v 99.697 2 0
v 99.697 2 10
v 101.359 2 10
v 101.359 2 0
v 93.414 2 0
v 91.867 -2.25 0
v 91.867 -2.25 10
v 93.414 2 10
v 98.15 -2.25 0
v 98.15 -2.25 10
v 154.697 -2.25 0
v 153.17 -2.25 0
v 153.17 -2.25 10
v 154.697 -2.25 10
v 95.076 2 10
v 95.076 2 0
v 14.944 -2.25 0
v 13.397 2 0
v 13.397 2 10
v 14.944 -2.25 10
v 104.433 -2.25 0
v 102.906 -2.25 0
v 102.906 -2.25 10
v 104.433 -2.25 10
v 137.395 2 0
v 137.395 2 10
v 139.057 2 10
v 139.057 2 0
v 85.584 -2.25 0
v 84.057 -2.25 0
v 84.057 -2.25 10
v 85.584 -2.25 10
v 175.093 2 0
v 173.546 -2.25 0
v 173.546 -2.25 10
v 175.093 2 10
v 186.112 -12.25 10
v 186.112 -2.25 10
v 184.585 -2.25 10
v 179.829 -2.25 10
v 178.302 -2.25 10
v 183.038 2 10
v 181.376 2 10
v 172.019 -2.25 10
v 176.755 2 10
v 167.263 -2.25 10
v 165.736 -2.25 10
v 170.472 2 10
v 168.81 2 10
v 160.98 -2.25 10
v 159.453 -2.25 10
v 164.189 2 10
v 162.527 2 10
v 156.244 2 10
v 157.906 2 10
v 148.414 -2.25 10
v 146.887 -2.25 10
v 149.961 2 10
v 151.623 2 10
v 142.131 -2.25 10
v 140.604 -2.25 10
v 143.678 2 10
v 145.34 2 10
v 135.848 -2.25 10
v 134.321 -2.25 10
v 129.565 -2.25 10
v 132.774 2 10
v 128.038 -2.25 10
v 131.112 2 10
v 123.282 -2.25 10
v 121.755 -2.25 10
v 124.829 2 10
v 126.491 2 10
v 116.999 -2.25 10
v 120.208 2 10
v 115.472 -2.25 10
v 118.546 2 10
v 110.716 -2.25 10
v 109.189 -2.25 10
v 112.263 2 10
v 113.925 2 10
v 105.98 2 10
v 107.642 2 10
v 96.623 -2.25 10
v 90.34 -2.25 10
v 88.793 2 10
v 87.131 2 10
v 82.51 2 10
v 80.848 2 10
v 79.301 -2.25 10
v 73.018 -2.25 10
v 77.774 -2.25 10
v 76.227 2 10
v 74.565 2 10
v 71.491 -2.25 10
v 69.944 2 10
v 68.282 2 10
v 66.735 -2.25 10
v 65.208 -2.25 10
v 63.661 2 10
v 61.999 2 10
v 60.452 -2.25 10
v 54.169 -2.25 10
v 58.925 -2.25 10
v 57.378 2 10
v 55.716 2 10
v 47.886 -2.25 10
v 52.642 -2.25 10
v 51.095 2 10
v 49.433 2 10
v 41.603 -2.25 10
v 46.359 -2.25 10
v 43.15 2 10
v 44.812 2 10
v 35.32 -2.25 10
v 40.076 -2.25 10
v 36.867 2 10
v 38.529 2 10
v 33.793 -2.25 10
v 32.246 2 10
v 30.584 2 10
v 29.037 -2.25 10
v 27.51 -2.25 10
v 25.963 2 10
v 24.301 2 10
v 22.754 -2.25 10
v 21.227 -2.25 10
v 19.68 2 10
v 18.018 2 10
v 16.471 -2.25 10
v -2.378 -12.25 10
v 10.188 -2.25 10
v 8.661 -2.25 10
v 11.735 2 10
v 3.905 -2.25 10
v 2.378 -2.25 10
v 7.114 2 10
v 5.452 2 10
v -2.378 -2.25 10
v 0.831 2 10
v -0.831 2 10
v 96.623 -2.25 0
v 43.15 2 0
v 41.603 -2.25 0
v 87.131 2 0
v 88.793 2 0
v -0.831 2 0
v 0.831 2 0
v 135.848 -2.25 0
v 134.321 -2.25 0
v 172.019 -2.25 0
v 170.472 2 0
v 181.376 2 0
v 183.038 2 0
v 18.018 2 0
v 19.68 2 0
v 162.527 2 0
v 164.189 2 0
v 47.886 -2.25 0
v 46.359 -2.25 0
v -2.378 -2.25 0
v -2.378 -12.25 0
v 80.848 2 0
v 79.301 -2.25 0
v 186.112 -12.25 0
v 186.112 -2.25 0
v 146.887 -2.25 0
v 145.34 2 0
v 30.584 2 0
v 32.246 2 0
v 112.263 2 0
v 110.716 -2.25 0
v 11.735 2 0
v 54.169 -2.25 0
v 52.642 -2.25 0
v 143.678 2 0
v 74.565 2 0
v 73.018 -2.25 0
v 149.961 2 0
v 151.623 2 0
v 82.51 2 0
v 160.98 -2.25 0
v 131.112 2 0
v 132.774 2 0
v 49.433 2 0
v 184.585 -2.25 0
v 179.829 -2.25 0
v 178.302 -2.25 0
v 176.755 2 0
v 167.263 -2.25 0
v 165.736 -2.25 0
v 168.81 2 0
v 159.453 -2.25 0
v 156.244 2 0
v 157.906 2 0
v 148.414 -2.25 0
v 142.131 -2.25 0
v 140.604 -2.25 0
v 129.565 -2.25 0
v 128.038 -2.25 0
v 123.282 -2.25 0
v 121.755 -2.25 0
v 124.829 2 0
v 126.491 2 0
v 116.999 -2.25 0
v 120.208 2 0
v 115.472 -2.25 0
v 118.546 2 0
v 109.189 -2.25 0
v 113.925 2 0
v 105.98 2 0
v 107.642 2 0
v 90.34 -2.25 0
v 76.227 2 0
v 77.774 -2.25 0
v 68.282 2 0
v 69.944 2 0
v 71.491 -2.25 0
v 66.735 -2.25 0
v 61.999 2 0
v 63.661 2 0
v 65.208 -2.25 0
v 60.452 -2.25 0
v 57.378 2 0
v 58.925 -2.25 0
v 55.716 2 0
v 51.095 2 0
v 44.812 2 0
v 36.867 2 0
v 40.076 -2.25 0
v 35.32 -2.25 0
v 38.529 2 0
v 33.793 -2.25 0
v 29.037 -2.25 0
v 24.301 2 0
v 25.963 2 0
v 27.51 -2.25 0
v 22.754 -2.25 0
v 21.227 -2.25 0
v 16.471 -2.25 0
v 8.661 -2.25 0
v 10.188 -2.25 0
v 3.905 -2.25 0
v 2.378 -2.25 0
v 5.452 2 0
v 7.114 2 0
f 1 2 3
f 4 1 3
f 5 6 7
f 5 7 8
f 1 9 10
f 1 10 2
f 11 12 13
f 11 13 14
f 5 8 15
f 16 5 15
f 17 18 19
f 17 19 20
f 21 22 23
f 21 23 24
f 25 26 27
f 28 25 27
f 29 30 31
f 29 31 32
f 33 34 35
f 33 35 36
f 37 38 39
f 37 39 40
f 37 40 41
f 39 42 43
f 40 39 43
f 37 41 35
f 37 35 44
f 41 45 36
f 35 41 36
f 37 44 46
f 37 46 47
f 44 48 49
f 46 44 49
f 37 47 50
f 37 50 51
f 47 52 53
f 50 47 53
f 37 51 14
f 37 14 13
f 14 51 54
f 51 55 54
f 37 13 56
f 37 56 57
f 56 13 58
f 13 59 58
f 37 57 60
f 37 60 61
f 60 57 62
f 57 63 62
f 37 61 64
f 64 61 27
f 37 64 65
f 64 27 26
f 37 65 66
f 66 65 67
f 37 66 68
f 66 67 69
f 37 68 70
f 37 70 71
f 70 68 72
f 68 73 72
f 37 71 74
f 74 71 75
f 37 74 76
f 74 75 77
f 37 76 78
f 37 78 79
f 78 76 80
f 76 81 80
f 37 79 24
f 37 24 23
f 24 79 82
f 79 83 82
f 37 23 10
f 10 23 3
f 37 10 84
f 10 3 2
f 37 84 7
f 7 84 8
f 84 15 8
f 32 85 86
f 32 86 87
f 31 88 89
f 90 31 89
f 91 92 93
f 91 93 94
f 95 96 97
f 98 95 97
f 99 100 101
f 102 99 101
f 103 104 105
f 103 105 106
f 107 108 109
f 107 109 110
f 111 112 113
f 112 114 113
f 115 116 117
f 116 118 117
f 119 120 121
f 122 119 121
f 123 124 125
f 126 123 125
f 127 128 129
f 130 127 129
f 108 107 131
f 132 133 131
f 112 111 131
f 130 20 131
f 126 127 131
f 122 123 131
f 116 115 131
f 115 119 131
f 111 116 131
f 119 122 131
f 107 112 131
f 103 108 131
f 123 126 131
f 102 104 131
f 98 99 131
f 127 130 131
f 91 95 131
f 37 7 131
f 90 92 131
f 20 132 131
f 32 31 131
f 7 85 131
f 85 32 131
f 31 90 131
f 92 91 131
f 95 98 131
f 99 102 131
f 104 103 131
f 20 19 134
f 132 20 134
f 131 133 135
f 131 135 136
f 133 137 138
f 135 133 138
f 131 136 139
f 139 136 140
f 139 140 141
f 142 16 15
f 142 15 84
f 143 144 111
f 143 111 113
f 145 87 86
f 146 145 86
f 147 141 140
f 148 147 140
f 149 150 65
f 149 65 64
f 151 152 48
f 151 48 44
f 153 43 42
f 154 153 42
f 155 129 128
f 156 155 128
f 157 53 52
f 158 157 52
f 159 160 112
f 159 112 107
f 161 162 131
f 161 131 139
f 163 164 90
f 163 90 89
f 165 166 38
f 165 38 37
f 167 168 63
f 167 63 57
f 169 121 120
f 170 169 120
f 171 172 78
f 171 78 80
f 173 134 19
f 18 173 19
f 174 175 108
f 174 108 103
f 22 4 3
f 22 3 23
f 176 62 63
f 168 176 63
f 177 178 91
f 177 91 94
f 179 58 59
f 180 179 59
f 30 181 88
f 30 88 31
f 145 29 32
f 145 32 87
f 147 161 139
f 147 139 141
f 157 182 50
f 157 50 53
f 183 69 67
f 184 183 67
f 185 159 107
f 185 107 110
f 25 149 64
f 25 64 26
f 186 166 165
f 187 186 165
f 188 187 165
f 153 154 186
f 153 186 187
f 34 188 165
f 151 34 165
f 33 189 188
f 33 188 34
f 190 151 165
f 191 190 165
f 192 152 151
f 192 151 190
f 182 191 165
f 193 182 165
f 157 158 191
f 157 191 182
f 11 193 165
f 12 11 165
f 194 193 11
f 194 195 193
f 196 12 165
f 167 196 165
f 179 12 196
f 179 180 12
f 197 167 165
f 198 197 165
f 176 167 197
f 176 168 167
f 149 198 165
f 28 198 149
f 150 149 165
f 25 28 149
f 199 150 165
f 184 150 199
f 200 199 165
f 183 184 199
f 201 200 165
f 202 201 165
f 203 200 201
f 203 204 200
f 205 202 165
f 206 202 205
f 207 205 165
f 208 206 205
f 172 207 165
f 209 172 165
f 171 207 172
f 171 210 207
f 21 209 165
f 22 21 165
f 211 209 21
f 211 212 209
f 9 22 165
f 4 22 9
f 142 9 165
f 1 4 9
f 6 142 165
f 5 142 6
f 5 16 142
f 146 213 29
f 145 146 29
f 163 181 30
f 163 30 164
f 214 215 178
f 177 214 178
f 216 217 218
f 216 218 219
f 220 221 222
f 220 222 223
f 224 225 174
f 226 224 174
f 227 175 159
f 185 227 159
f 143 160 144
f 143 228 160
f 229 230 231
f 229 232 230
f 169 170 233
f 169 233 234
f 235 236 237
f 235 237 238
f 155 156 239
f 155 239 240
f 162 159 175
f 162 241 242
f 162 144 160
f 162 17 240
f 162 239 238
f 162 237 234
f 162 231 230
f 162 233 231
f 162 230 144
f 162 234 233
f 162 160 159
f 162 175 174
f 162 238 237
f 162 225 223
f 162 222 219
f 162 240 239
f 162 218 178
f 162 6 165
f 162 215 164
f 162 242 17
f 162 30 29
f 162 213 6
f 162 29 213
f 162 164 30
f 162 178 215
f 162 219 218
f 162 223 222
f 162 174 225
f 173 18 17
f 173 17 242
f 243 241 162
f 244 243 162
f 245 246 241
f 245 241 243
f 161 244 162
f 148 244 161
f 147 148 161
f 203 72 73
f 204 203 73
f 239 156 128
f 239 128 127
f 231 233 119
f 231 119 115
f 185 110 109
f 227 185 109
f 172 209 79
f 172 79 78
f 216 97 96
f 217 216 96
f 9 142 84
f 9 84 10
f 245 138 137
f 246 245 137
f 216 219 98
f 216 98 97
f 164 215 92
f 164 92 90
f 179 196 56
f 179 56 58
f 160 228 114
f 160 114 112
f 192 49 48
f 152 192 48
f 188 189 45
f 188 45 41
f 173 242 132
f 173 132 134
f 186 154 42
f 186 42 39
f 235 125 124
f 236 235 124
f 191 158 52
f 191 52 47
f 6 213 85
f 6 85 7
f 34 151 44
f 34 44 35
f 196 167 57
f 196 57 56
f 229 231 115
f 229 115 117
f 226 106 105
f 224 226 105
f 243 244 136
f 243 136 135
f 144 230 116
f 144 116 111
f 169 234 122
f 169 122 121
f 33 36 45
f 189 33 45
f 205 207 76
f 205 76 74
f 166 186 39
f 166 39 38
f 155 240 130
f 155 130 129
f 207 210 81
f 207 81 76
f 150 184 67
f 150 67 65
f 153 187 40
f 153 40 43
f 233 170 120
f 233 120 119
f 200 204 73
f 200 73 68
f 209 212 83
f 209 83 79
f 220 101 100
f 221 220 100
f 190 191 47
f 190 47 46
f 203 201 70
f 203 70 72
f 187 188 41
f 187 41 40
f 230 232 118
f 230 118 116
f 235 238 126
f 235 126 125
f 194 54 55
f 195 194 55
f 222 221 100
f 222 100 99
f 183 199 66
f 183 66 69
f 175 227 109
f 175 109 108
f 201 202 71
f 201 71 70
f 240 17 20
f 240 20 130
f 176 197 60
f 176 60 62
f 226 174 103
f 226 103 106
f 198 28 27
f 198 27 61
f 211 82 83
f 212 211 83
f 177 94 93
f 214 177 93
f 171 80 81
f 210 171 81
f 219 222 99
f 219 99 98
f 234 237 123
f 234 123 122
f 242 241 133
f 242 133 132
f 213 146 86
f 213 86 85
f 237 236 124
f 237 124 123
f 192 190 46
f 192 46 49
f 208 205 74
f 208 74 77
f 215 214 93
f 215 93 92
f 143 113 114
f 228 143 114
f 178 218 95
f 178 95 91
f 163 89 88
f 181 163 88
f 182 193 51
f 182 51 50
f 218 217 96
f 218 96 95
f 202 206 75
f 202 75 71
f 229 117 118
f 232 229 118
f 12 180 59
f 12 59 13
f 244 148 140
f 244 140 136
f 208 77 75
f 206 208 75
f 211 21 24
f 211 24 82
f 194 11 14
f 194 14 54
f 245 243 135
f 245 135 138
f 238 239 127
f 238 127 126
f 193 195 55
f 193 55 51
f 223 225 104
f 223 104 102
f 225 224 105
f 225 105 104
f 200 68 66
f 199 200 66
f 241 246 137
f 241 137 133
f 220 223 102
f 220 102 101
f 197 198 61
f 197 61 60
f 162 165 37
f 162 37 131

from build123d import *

# Parameters (mm, degrees)
BOSS_EXTRU_1_DEPTH         = 10
R_P_TITION_LIN_AIRE1_COUNT = 30
R_P_TITION_LIN_AIRE1_PITCH = 6.283


with BuildPart() as part:
    # Esquisse1 → Boss.-Extru.1 (new body)
    with BuildSketch(Plane.XY):
        Polygon((0.831079968, 2), (2.377953464, -2.25), (3.905046536, -2.25), (3.905046536, -12.25), (-2.377953464, -12.25), (-2.377953464, -2.25), (-0.831079968, 2), align=None)
    boss_extru_1 = extrude(amount=BOSS_EXTRU_1_DEPTH)

    # Répétition linéaire1: Boss.-Extru.1 ×30
    with Locations(*[(i * R_P_TITION_LIN_AIRE1_PITCH, 0, 0) for i in range(1, R_P_TITION_LIN_AIRE1_COUNT)]):
        add(boss_extru_1)


solid = part.part
